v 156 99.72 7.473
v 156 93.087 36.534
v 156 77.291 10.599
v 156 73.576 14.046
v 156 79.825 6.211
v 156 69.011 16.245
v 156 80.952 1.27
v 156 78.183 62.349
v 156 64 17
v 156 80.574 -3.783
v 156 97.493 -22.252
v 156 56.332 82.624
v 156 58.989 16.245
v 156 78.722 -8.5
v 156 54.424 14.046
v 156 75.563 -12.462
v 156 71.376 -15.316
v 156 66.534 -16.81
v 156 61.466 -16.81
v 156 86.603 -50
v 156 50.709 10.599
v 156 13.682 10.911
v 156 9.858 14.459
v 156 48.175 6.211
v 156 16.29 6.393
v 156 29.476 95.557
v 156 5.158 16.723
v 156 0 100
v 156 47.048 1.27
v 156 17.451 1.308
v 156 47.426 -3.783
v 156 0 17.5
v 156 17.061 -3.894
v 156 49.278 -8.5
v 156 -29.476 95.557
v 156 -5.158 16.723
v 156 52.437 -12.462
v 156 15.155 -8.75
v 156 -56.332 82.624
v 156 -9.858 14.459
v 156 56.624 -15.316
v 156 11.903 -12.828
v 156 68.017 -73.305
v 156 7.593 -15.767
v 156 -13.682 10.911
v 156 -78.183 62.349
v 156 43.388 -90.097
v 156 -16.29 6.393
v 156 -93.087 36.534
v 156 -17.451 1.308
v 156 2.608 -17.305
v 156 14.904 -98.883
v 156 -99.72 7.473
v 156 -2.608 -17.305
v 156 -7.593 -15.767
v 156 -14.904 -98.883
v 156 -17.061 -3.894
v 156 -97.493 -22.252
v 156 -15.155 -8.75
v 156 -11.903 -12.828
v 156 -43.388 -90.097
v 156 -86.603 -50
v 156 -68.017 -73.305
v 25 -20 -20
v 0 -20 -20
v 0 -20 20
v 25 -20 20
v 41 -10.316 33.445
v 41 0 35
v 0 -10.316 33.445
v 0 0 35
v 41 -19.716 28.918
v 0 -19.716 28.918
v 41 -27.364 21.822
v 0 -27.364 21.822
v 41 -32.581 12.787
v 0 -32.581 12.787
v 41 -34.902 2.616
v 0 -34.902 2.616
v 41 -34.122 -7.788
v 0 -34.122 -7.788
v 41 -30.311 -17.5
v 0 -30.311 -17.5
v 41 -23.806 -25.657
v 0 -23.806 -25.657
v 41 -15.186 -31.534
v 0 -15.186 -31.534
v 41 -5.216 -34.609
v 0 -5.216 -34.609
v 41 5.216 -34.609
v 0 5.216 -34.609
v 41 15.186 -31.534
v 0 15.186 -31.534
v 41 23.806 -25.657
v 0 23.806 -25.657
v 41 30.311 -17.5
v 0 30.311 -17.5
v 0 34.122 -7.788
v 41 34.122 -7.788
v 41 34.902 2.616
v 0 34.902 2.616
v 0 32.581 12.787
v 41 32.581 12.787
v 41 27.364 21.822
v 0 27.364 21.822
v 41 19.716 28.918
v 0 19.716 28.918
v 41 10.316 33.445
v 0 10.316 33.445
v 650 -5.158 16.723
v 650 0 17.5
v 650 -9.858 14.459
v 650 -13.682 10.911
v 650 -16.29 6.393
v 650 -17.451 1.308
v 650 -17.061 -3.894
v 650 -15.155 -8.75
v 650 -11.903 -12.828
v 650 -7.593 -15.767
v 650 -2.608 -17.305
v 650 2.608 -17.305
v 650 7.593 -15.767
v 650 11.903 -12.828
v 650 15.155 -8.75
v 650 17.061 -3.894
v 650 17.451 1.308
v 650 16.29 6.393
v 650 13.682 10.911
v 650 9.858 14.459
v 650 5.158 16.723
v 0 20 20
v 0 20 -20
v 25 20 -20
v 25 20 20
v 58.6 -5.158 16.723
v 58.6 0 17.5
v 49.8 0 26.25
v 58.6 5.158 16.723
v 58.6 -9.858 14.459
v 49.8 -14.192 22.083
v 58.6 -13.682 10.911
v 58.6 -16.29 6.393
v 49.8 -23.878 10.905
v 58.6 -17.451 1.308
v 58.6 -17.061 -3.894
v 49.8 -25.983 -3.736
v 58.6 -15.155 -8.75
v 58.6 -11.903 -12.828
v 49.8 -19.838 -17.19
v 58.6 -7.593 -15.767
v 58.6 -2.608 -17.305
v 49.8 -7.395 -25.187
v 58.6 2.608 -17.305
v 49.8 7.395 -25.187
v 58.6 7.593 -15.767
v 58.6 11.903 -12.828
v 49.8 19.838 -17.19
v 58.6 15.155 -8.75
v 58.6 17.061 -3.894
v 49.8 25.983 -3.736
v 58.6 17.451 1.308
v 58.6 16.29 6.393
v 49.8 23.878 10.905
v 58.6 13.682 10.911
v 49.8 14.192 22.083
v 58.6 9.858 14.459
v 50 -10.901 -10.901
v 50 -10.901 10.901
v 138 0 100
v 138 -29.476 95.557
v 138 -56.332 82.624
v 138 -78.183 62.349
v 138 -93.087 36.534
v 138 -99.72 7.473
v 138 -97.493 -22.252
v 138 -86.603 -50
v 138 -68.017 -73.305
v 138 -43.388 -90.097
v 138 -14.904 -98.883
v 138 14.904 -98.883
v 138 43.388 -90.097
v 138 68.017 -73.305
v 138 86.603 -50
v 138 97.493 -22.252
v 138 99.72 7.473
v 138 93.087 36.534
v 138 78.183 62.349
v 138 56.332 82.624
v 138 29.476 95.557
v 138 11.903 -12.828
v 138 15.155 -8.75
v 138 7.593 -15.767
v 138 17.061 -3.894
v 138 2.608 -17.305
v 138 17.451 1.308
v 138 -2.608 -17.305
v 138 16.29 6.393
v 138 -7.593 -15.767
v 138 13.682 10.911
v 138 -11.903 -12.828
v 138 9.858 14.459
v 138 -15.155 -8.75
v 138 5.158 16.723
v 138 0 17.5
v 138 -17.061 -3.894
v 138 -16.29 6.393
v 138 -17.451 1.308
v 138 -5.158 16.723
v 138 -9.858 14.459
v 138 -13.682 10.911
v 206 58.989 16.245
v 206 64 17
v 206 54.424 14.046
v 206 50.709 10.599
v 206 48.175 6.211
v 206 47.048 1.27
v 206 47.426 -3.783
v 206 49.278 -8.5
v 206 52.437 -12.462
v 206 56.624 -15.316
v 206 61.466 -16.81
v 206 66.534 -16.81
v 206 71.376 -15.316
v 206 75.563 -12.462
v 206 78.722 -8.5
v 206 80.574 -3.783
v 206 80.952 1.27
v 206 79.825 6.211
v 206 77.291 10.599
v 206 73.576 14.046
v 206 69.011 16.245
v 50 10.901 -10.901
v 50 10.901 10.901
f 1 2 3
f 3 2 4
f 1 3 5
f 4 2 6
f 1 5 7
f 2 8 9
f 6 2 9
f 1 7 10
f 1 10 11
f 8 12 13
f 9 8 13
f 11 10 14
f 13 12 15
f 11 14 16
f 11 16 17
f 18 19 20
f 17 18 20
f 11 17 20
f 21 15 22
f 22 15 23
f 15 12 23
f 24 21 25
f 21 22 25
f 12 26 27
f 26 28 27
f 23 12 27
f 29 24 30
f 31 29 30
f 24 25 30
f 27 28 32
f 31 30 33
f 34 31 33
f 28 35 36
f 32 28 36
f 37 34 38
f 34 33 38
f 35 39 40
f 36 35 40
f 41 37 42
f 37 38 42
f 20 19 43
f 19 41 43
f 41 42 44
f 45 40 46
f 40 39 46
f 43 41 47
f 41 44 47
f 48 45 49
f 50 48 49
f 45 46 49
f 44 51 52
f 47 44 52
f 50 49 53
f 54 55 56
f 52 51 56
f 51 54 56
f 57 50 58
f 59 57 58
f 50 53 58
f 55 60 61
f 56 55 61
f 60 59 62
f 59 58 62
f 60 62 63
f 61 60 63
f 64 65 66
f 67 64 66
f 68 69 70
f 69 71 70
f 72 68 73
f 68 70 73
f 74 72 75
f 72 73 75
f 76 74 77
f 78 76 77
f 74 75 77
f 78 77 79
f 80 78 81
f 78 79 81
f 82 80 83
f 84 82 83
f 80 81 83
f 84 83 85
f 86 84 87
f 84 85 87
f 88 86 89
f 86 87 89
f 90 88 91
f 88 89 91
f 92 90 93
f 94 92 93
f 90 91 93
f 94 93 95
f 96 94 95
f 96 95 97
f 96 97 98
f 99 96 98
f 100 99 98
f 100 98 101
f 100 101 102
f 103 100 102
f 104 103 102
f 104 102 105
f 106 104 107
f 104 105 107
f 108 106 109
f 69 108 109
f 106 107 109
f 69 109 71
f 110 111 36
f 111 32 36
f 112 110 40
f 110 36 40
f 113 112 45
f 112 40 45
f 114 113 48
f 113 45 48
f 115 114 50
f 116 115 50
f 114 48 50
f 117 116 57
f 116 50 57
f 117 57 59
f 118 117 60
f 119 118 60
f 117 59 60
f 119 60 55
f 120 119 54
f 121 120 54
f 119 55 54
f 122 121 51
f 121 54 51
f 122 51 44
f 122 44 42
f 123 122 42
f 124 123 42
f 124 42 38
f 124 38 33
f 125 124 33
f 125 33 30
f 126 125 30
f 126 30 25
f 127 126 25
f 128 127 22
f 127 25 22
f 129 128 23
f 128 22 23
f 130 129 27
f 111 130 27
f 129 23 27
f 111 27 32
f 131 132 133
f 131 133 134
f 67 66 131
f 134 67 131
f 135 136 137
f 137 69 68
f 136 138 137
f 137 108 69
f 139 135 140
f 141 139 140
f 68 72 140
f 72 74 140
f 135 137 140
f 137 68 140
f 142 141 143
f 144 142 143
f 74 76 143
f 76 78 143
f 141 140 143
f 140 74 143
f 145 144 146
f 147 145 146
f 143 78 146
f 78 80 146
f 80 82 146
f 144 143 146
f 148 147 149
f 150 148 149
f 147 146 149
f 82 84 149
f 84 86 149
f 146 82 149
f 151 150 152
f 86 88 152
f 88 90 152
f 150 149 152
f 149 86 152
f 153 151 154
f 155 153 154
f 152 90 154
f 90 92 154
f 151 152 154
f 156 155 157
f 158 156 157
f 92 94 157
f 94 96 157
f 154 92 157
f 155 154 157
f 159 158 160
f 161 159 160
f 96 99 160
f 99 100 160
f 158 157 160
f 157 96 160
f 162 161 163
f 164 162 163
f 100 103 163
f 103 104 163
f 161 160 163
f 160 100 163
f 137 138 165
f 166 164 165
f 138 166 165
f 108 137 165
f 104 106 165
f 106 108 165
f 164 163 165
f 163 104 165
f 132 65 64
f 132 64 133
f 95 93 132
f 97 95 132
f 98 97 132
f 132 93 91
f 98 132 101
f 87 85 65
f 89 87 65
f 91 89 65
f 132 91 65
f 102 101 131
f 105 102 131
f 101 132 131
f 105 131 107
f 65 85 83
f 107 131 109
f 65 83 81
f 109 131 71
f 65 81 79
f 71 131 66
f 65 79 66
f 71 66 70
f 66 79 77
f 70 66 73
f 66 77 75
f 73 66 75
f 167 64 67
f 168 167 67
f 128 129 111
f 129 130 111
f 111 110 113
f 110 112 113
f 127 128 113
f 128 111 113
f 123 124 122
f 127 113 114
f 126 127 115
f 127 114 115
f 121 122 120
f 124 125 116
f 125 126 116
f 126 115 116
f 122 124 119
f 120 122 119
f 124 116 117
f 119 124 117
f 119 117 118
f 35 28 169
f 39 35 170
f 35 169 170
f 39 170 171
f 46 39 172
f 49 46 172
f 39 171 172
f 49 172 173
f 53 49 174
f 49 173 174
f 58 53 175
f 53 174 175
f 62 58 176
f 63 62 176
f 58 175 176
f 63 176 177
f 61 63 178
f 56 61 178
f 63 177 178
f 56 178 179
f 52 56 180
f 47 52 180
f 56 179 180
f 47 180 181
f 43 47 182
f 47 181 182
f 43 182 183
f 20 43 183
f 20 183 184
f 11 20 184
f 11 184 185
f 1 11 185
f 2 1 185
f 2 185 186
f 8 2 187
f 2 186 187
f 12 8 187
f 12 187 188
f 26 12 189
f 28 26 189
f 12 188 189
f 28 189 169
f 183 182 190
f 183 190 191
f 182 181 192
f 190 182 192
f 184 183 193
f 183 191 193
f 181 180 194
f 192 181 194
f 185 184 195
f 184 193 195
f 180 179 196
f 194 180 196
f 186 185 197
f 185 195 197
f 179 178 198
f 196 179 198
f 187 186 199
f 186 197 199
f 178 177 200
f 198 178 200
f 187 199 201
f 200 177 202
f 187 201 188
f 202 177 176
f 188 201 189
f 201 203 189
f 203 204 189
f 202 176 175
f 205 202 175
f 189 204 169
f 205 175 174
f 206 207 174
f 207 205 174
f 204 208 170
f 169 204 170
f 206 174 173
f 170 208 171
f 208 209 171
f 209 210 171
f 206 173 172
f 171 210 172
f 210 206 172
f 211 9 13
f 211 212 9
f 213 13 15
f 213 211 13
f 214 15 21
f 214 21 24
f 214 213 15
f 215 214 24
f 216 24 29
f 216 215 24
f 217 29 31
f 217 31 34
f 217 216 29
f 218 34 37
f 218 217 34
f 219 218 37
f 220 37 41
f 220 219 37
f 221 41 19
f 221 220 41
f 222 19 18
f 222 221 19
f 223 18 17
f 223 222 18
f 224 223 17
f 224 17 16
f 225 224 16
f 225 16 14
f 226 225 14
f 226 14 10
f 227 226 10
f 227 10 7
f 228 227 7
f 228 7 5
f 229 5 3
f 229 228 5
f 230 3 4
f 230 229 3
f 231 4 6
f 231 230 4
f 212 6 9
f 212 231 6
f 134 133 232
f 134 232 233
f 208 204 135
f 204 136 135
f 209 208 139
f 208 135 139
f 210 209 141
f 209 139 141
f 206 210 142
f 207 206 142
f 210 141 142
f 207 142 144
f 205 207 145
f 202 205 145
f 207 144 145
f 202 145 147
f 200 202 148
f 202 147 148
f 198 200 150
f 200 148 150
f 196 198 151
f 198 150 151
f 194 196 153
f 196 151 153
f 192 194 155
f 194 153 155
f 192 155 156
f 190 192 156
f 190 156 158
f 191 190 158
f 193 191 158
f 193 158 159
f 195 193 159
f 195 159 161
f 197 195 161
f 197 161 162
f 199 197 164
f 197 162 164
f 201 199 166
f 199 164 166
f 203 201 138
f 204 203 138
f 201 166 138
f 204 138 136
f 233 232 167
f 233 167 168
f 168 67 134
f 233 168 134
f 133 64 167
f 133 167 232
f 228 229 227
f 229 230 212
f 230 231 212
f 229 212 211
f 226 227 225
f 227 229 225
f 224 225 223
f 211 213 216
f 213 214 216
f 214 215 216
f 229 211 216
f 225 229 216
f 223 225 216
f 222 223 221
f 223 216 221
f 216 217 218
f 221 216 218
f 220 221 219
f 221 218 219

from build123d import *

# Parameters (mm, degrees)
ESQUISSE2_W             = 50
ESQUISSE2_H             = 17
ESQUISSE3_W             = 40
ESQUISSE3_H             = 40
ENL_V_MAT_EXTRU_1_DEPTH = 25
ENL_V_START             = -25
ESQUISSE3_3_W           = 40
ESQUISSE3_3_H           = 40
ENL_V_MAT_EXTRU_2_DEPTH = 25
ENL_V_MAT_EXTRU_2_DRAFT = -20


with BuildPart() as part:
    # Esquisse1 → Révolution1 (revolve)
    with BuildSketch(Plane.XY, mode=Mode.PRIVATE) as r_volution1_sk:
        Polygon((650, 0), (650, 17.5), (156, 17.5), (156, 100), (138, 100), (138, 17.5), (58.6, 17.5), (41, 35), (0, 35), (0, 0), align=None)
    revolve(r_volution1_sk.sketch.rotate(Axis((0, 0, 0), (1, 0, 0)), 90), axis=Axis((0, 0, 0), (1, 0, 0)))

    # Esquisse2 → Révolution2 (revolve)
    with BuildSketch(Plane.XY, mode=Mode.PRIVATE) as r_volution2_sk:
        with Locations((181, 72.5)):
            Rectangle(ESQUISSE2_W, ESQUISSE2_H)
    revolve(r_volution2_sk.sketch.rotate(Axis((156, 64, 0), (1, 0, 0)), 90), axis=Axis((156, 64, 0), (1, 0, 0)))

    # Esquisse3 → Enlèv. mat.-Extru.1 (cut)
    with BuildSketch(Plane.ZY):
        Rectangle(ESQUISSE3_W, ESQUISSE3_H)
    extrude(amount=-ENL_V_MAT_EXTRU_1_DEPTH, mode=Mode.SUBTRACT)


with BuildPart() as enl_v_mat_extru_2_tool:
    # Esquisse3<3> → Enlèv. mat.-Extru.2 (with draft: the straight prism first)
    with BuildSketch(Plane.ZY.offset(ENL_V_START)):
        Rectangle(ESQUISSE3_3_W, ESQUISSE3_3_H)
    extrude(amount=-ENL_V_MAT_EXTRU_2_DEPTH)
    # Enlèv. mat.-Extru.2: the draft: its side faces are tilted about the plane it starts from
    enl_v_mat_extru_2_sides = [enl_v_mat_extru_2_tool.faces().sort_by_distance(p)[0] for p in [
        (37.5, 0, -20),
        (37.5, -20, 0),
        (37.5, 0, 20),
        (37.5, 20, 0),
    ]]
    draft(enl_v_mat_extru_2_sides, Plane.ZY.offset(ENL_V_START), ENL_V_MAT_EXTRU_2_DRAFT)


with BuildPart() as part_1:
    add(part.part)

    # Enlèv. mat.-Extru.2: cut by enl_v_mat_extru_2_tool
    add(enl_v_mat_extru_2_tool.part, mode=Mode.SUBTRACT)


solid = part_1.part
